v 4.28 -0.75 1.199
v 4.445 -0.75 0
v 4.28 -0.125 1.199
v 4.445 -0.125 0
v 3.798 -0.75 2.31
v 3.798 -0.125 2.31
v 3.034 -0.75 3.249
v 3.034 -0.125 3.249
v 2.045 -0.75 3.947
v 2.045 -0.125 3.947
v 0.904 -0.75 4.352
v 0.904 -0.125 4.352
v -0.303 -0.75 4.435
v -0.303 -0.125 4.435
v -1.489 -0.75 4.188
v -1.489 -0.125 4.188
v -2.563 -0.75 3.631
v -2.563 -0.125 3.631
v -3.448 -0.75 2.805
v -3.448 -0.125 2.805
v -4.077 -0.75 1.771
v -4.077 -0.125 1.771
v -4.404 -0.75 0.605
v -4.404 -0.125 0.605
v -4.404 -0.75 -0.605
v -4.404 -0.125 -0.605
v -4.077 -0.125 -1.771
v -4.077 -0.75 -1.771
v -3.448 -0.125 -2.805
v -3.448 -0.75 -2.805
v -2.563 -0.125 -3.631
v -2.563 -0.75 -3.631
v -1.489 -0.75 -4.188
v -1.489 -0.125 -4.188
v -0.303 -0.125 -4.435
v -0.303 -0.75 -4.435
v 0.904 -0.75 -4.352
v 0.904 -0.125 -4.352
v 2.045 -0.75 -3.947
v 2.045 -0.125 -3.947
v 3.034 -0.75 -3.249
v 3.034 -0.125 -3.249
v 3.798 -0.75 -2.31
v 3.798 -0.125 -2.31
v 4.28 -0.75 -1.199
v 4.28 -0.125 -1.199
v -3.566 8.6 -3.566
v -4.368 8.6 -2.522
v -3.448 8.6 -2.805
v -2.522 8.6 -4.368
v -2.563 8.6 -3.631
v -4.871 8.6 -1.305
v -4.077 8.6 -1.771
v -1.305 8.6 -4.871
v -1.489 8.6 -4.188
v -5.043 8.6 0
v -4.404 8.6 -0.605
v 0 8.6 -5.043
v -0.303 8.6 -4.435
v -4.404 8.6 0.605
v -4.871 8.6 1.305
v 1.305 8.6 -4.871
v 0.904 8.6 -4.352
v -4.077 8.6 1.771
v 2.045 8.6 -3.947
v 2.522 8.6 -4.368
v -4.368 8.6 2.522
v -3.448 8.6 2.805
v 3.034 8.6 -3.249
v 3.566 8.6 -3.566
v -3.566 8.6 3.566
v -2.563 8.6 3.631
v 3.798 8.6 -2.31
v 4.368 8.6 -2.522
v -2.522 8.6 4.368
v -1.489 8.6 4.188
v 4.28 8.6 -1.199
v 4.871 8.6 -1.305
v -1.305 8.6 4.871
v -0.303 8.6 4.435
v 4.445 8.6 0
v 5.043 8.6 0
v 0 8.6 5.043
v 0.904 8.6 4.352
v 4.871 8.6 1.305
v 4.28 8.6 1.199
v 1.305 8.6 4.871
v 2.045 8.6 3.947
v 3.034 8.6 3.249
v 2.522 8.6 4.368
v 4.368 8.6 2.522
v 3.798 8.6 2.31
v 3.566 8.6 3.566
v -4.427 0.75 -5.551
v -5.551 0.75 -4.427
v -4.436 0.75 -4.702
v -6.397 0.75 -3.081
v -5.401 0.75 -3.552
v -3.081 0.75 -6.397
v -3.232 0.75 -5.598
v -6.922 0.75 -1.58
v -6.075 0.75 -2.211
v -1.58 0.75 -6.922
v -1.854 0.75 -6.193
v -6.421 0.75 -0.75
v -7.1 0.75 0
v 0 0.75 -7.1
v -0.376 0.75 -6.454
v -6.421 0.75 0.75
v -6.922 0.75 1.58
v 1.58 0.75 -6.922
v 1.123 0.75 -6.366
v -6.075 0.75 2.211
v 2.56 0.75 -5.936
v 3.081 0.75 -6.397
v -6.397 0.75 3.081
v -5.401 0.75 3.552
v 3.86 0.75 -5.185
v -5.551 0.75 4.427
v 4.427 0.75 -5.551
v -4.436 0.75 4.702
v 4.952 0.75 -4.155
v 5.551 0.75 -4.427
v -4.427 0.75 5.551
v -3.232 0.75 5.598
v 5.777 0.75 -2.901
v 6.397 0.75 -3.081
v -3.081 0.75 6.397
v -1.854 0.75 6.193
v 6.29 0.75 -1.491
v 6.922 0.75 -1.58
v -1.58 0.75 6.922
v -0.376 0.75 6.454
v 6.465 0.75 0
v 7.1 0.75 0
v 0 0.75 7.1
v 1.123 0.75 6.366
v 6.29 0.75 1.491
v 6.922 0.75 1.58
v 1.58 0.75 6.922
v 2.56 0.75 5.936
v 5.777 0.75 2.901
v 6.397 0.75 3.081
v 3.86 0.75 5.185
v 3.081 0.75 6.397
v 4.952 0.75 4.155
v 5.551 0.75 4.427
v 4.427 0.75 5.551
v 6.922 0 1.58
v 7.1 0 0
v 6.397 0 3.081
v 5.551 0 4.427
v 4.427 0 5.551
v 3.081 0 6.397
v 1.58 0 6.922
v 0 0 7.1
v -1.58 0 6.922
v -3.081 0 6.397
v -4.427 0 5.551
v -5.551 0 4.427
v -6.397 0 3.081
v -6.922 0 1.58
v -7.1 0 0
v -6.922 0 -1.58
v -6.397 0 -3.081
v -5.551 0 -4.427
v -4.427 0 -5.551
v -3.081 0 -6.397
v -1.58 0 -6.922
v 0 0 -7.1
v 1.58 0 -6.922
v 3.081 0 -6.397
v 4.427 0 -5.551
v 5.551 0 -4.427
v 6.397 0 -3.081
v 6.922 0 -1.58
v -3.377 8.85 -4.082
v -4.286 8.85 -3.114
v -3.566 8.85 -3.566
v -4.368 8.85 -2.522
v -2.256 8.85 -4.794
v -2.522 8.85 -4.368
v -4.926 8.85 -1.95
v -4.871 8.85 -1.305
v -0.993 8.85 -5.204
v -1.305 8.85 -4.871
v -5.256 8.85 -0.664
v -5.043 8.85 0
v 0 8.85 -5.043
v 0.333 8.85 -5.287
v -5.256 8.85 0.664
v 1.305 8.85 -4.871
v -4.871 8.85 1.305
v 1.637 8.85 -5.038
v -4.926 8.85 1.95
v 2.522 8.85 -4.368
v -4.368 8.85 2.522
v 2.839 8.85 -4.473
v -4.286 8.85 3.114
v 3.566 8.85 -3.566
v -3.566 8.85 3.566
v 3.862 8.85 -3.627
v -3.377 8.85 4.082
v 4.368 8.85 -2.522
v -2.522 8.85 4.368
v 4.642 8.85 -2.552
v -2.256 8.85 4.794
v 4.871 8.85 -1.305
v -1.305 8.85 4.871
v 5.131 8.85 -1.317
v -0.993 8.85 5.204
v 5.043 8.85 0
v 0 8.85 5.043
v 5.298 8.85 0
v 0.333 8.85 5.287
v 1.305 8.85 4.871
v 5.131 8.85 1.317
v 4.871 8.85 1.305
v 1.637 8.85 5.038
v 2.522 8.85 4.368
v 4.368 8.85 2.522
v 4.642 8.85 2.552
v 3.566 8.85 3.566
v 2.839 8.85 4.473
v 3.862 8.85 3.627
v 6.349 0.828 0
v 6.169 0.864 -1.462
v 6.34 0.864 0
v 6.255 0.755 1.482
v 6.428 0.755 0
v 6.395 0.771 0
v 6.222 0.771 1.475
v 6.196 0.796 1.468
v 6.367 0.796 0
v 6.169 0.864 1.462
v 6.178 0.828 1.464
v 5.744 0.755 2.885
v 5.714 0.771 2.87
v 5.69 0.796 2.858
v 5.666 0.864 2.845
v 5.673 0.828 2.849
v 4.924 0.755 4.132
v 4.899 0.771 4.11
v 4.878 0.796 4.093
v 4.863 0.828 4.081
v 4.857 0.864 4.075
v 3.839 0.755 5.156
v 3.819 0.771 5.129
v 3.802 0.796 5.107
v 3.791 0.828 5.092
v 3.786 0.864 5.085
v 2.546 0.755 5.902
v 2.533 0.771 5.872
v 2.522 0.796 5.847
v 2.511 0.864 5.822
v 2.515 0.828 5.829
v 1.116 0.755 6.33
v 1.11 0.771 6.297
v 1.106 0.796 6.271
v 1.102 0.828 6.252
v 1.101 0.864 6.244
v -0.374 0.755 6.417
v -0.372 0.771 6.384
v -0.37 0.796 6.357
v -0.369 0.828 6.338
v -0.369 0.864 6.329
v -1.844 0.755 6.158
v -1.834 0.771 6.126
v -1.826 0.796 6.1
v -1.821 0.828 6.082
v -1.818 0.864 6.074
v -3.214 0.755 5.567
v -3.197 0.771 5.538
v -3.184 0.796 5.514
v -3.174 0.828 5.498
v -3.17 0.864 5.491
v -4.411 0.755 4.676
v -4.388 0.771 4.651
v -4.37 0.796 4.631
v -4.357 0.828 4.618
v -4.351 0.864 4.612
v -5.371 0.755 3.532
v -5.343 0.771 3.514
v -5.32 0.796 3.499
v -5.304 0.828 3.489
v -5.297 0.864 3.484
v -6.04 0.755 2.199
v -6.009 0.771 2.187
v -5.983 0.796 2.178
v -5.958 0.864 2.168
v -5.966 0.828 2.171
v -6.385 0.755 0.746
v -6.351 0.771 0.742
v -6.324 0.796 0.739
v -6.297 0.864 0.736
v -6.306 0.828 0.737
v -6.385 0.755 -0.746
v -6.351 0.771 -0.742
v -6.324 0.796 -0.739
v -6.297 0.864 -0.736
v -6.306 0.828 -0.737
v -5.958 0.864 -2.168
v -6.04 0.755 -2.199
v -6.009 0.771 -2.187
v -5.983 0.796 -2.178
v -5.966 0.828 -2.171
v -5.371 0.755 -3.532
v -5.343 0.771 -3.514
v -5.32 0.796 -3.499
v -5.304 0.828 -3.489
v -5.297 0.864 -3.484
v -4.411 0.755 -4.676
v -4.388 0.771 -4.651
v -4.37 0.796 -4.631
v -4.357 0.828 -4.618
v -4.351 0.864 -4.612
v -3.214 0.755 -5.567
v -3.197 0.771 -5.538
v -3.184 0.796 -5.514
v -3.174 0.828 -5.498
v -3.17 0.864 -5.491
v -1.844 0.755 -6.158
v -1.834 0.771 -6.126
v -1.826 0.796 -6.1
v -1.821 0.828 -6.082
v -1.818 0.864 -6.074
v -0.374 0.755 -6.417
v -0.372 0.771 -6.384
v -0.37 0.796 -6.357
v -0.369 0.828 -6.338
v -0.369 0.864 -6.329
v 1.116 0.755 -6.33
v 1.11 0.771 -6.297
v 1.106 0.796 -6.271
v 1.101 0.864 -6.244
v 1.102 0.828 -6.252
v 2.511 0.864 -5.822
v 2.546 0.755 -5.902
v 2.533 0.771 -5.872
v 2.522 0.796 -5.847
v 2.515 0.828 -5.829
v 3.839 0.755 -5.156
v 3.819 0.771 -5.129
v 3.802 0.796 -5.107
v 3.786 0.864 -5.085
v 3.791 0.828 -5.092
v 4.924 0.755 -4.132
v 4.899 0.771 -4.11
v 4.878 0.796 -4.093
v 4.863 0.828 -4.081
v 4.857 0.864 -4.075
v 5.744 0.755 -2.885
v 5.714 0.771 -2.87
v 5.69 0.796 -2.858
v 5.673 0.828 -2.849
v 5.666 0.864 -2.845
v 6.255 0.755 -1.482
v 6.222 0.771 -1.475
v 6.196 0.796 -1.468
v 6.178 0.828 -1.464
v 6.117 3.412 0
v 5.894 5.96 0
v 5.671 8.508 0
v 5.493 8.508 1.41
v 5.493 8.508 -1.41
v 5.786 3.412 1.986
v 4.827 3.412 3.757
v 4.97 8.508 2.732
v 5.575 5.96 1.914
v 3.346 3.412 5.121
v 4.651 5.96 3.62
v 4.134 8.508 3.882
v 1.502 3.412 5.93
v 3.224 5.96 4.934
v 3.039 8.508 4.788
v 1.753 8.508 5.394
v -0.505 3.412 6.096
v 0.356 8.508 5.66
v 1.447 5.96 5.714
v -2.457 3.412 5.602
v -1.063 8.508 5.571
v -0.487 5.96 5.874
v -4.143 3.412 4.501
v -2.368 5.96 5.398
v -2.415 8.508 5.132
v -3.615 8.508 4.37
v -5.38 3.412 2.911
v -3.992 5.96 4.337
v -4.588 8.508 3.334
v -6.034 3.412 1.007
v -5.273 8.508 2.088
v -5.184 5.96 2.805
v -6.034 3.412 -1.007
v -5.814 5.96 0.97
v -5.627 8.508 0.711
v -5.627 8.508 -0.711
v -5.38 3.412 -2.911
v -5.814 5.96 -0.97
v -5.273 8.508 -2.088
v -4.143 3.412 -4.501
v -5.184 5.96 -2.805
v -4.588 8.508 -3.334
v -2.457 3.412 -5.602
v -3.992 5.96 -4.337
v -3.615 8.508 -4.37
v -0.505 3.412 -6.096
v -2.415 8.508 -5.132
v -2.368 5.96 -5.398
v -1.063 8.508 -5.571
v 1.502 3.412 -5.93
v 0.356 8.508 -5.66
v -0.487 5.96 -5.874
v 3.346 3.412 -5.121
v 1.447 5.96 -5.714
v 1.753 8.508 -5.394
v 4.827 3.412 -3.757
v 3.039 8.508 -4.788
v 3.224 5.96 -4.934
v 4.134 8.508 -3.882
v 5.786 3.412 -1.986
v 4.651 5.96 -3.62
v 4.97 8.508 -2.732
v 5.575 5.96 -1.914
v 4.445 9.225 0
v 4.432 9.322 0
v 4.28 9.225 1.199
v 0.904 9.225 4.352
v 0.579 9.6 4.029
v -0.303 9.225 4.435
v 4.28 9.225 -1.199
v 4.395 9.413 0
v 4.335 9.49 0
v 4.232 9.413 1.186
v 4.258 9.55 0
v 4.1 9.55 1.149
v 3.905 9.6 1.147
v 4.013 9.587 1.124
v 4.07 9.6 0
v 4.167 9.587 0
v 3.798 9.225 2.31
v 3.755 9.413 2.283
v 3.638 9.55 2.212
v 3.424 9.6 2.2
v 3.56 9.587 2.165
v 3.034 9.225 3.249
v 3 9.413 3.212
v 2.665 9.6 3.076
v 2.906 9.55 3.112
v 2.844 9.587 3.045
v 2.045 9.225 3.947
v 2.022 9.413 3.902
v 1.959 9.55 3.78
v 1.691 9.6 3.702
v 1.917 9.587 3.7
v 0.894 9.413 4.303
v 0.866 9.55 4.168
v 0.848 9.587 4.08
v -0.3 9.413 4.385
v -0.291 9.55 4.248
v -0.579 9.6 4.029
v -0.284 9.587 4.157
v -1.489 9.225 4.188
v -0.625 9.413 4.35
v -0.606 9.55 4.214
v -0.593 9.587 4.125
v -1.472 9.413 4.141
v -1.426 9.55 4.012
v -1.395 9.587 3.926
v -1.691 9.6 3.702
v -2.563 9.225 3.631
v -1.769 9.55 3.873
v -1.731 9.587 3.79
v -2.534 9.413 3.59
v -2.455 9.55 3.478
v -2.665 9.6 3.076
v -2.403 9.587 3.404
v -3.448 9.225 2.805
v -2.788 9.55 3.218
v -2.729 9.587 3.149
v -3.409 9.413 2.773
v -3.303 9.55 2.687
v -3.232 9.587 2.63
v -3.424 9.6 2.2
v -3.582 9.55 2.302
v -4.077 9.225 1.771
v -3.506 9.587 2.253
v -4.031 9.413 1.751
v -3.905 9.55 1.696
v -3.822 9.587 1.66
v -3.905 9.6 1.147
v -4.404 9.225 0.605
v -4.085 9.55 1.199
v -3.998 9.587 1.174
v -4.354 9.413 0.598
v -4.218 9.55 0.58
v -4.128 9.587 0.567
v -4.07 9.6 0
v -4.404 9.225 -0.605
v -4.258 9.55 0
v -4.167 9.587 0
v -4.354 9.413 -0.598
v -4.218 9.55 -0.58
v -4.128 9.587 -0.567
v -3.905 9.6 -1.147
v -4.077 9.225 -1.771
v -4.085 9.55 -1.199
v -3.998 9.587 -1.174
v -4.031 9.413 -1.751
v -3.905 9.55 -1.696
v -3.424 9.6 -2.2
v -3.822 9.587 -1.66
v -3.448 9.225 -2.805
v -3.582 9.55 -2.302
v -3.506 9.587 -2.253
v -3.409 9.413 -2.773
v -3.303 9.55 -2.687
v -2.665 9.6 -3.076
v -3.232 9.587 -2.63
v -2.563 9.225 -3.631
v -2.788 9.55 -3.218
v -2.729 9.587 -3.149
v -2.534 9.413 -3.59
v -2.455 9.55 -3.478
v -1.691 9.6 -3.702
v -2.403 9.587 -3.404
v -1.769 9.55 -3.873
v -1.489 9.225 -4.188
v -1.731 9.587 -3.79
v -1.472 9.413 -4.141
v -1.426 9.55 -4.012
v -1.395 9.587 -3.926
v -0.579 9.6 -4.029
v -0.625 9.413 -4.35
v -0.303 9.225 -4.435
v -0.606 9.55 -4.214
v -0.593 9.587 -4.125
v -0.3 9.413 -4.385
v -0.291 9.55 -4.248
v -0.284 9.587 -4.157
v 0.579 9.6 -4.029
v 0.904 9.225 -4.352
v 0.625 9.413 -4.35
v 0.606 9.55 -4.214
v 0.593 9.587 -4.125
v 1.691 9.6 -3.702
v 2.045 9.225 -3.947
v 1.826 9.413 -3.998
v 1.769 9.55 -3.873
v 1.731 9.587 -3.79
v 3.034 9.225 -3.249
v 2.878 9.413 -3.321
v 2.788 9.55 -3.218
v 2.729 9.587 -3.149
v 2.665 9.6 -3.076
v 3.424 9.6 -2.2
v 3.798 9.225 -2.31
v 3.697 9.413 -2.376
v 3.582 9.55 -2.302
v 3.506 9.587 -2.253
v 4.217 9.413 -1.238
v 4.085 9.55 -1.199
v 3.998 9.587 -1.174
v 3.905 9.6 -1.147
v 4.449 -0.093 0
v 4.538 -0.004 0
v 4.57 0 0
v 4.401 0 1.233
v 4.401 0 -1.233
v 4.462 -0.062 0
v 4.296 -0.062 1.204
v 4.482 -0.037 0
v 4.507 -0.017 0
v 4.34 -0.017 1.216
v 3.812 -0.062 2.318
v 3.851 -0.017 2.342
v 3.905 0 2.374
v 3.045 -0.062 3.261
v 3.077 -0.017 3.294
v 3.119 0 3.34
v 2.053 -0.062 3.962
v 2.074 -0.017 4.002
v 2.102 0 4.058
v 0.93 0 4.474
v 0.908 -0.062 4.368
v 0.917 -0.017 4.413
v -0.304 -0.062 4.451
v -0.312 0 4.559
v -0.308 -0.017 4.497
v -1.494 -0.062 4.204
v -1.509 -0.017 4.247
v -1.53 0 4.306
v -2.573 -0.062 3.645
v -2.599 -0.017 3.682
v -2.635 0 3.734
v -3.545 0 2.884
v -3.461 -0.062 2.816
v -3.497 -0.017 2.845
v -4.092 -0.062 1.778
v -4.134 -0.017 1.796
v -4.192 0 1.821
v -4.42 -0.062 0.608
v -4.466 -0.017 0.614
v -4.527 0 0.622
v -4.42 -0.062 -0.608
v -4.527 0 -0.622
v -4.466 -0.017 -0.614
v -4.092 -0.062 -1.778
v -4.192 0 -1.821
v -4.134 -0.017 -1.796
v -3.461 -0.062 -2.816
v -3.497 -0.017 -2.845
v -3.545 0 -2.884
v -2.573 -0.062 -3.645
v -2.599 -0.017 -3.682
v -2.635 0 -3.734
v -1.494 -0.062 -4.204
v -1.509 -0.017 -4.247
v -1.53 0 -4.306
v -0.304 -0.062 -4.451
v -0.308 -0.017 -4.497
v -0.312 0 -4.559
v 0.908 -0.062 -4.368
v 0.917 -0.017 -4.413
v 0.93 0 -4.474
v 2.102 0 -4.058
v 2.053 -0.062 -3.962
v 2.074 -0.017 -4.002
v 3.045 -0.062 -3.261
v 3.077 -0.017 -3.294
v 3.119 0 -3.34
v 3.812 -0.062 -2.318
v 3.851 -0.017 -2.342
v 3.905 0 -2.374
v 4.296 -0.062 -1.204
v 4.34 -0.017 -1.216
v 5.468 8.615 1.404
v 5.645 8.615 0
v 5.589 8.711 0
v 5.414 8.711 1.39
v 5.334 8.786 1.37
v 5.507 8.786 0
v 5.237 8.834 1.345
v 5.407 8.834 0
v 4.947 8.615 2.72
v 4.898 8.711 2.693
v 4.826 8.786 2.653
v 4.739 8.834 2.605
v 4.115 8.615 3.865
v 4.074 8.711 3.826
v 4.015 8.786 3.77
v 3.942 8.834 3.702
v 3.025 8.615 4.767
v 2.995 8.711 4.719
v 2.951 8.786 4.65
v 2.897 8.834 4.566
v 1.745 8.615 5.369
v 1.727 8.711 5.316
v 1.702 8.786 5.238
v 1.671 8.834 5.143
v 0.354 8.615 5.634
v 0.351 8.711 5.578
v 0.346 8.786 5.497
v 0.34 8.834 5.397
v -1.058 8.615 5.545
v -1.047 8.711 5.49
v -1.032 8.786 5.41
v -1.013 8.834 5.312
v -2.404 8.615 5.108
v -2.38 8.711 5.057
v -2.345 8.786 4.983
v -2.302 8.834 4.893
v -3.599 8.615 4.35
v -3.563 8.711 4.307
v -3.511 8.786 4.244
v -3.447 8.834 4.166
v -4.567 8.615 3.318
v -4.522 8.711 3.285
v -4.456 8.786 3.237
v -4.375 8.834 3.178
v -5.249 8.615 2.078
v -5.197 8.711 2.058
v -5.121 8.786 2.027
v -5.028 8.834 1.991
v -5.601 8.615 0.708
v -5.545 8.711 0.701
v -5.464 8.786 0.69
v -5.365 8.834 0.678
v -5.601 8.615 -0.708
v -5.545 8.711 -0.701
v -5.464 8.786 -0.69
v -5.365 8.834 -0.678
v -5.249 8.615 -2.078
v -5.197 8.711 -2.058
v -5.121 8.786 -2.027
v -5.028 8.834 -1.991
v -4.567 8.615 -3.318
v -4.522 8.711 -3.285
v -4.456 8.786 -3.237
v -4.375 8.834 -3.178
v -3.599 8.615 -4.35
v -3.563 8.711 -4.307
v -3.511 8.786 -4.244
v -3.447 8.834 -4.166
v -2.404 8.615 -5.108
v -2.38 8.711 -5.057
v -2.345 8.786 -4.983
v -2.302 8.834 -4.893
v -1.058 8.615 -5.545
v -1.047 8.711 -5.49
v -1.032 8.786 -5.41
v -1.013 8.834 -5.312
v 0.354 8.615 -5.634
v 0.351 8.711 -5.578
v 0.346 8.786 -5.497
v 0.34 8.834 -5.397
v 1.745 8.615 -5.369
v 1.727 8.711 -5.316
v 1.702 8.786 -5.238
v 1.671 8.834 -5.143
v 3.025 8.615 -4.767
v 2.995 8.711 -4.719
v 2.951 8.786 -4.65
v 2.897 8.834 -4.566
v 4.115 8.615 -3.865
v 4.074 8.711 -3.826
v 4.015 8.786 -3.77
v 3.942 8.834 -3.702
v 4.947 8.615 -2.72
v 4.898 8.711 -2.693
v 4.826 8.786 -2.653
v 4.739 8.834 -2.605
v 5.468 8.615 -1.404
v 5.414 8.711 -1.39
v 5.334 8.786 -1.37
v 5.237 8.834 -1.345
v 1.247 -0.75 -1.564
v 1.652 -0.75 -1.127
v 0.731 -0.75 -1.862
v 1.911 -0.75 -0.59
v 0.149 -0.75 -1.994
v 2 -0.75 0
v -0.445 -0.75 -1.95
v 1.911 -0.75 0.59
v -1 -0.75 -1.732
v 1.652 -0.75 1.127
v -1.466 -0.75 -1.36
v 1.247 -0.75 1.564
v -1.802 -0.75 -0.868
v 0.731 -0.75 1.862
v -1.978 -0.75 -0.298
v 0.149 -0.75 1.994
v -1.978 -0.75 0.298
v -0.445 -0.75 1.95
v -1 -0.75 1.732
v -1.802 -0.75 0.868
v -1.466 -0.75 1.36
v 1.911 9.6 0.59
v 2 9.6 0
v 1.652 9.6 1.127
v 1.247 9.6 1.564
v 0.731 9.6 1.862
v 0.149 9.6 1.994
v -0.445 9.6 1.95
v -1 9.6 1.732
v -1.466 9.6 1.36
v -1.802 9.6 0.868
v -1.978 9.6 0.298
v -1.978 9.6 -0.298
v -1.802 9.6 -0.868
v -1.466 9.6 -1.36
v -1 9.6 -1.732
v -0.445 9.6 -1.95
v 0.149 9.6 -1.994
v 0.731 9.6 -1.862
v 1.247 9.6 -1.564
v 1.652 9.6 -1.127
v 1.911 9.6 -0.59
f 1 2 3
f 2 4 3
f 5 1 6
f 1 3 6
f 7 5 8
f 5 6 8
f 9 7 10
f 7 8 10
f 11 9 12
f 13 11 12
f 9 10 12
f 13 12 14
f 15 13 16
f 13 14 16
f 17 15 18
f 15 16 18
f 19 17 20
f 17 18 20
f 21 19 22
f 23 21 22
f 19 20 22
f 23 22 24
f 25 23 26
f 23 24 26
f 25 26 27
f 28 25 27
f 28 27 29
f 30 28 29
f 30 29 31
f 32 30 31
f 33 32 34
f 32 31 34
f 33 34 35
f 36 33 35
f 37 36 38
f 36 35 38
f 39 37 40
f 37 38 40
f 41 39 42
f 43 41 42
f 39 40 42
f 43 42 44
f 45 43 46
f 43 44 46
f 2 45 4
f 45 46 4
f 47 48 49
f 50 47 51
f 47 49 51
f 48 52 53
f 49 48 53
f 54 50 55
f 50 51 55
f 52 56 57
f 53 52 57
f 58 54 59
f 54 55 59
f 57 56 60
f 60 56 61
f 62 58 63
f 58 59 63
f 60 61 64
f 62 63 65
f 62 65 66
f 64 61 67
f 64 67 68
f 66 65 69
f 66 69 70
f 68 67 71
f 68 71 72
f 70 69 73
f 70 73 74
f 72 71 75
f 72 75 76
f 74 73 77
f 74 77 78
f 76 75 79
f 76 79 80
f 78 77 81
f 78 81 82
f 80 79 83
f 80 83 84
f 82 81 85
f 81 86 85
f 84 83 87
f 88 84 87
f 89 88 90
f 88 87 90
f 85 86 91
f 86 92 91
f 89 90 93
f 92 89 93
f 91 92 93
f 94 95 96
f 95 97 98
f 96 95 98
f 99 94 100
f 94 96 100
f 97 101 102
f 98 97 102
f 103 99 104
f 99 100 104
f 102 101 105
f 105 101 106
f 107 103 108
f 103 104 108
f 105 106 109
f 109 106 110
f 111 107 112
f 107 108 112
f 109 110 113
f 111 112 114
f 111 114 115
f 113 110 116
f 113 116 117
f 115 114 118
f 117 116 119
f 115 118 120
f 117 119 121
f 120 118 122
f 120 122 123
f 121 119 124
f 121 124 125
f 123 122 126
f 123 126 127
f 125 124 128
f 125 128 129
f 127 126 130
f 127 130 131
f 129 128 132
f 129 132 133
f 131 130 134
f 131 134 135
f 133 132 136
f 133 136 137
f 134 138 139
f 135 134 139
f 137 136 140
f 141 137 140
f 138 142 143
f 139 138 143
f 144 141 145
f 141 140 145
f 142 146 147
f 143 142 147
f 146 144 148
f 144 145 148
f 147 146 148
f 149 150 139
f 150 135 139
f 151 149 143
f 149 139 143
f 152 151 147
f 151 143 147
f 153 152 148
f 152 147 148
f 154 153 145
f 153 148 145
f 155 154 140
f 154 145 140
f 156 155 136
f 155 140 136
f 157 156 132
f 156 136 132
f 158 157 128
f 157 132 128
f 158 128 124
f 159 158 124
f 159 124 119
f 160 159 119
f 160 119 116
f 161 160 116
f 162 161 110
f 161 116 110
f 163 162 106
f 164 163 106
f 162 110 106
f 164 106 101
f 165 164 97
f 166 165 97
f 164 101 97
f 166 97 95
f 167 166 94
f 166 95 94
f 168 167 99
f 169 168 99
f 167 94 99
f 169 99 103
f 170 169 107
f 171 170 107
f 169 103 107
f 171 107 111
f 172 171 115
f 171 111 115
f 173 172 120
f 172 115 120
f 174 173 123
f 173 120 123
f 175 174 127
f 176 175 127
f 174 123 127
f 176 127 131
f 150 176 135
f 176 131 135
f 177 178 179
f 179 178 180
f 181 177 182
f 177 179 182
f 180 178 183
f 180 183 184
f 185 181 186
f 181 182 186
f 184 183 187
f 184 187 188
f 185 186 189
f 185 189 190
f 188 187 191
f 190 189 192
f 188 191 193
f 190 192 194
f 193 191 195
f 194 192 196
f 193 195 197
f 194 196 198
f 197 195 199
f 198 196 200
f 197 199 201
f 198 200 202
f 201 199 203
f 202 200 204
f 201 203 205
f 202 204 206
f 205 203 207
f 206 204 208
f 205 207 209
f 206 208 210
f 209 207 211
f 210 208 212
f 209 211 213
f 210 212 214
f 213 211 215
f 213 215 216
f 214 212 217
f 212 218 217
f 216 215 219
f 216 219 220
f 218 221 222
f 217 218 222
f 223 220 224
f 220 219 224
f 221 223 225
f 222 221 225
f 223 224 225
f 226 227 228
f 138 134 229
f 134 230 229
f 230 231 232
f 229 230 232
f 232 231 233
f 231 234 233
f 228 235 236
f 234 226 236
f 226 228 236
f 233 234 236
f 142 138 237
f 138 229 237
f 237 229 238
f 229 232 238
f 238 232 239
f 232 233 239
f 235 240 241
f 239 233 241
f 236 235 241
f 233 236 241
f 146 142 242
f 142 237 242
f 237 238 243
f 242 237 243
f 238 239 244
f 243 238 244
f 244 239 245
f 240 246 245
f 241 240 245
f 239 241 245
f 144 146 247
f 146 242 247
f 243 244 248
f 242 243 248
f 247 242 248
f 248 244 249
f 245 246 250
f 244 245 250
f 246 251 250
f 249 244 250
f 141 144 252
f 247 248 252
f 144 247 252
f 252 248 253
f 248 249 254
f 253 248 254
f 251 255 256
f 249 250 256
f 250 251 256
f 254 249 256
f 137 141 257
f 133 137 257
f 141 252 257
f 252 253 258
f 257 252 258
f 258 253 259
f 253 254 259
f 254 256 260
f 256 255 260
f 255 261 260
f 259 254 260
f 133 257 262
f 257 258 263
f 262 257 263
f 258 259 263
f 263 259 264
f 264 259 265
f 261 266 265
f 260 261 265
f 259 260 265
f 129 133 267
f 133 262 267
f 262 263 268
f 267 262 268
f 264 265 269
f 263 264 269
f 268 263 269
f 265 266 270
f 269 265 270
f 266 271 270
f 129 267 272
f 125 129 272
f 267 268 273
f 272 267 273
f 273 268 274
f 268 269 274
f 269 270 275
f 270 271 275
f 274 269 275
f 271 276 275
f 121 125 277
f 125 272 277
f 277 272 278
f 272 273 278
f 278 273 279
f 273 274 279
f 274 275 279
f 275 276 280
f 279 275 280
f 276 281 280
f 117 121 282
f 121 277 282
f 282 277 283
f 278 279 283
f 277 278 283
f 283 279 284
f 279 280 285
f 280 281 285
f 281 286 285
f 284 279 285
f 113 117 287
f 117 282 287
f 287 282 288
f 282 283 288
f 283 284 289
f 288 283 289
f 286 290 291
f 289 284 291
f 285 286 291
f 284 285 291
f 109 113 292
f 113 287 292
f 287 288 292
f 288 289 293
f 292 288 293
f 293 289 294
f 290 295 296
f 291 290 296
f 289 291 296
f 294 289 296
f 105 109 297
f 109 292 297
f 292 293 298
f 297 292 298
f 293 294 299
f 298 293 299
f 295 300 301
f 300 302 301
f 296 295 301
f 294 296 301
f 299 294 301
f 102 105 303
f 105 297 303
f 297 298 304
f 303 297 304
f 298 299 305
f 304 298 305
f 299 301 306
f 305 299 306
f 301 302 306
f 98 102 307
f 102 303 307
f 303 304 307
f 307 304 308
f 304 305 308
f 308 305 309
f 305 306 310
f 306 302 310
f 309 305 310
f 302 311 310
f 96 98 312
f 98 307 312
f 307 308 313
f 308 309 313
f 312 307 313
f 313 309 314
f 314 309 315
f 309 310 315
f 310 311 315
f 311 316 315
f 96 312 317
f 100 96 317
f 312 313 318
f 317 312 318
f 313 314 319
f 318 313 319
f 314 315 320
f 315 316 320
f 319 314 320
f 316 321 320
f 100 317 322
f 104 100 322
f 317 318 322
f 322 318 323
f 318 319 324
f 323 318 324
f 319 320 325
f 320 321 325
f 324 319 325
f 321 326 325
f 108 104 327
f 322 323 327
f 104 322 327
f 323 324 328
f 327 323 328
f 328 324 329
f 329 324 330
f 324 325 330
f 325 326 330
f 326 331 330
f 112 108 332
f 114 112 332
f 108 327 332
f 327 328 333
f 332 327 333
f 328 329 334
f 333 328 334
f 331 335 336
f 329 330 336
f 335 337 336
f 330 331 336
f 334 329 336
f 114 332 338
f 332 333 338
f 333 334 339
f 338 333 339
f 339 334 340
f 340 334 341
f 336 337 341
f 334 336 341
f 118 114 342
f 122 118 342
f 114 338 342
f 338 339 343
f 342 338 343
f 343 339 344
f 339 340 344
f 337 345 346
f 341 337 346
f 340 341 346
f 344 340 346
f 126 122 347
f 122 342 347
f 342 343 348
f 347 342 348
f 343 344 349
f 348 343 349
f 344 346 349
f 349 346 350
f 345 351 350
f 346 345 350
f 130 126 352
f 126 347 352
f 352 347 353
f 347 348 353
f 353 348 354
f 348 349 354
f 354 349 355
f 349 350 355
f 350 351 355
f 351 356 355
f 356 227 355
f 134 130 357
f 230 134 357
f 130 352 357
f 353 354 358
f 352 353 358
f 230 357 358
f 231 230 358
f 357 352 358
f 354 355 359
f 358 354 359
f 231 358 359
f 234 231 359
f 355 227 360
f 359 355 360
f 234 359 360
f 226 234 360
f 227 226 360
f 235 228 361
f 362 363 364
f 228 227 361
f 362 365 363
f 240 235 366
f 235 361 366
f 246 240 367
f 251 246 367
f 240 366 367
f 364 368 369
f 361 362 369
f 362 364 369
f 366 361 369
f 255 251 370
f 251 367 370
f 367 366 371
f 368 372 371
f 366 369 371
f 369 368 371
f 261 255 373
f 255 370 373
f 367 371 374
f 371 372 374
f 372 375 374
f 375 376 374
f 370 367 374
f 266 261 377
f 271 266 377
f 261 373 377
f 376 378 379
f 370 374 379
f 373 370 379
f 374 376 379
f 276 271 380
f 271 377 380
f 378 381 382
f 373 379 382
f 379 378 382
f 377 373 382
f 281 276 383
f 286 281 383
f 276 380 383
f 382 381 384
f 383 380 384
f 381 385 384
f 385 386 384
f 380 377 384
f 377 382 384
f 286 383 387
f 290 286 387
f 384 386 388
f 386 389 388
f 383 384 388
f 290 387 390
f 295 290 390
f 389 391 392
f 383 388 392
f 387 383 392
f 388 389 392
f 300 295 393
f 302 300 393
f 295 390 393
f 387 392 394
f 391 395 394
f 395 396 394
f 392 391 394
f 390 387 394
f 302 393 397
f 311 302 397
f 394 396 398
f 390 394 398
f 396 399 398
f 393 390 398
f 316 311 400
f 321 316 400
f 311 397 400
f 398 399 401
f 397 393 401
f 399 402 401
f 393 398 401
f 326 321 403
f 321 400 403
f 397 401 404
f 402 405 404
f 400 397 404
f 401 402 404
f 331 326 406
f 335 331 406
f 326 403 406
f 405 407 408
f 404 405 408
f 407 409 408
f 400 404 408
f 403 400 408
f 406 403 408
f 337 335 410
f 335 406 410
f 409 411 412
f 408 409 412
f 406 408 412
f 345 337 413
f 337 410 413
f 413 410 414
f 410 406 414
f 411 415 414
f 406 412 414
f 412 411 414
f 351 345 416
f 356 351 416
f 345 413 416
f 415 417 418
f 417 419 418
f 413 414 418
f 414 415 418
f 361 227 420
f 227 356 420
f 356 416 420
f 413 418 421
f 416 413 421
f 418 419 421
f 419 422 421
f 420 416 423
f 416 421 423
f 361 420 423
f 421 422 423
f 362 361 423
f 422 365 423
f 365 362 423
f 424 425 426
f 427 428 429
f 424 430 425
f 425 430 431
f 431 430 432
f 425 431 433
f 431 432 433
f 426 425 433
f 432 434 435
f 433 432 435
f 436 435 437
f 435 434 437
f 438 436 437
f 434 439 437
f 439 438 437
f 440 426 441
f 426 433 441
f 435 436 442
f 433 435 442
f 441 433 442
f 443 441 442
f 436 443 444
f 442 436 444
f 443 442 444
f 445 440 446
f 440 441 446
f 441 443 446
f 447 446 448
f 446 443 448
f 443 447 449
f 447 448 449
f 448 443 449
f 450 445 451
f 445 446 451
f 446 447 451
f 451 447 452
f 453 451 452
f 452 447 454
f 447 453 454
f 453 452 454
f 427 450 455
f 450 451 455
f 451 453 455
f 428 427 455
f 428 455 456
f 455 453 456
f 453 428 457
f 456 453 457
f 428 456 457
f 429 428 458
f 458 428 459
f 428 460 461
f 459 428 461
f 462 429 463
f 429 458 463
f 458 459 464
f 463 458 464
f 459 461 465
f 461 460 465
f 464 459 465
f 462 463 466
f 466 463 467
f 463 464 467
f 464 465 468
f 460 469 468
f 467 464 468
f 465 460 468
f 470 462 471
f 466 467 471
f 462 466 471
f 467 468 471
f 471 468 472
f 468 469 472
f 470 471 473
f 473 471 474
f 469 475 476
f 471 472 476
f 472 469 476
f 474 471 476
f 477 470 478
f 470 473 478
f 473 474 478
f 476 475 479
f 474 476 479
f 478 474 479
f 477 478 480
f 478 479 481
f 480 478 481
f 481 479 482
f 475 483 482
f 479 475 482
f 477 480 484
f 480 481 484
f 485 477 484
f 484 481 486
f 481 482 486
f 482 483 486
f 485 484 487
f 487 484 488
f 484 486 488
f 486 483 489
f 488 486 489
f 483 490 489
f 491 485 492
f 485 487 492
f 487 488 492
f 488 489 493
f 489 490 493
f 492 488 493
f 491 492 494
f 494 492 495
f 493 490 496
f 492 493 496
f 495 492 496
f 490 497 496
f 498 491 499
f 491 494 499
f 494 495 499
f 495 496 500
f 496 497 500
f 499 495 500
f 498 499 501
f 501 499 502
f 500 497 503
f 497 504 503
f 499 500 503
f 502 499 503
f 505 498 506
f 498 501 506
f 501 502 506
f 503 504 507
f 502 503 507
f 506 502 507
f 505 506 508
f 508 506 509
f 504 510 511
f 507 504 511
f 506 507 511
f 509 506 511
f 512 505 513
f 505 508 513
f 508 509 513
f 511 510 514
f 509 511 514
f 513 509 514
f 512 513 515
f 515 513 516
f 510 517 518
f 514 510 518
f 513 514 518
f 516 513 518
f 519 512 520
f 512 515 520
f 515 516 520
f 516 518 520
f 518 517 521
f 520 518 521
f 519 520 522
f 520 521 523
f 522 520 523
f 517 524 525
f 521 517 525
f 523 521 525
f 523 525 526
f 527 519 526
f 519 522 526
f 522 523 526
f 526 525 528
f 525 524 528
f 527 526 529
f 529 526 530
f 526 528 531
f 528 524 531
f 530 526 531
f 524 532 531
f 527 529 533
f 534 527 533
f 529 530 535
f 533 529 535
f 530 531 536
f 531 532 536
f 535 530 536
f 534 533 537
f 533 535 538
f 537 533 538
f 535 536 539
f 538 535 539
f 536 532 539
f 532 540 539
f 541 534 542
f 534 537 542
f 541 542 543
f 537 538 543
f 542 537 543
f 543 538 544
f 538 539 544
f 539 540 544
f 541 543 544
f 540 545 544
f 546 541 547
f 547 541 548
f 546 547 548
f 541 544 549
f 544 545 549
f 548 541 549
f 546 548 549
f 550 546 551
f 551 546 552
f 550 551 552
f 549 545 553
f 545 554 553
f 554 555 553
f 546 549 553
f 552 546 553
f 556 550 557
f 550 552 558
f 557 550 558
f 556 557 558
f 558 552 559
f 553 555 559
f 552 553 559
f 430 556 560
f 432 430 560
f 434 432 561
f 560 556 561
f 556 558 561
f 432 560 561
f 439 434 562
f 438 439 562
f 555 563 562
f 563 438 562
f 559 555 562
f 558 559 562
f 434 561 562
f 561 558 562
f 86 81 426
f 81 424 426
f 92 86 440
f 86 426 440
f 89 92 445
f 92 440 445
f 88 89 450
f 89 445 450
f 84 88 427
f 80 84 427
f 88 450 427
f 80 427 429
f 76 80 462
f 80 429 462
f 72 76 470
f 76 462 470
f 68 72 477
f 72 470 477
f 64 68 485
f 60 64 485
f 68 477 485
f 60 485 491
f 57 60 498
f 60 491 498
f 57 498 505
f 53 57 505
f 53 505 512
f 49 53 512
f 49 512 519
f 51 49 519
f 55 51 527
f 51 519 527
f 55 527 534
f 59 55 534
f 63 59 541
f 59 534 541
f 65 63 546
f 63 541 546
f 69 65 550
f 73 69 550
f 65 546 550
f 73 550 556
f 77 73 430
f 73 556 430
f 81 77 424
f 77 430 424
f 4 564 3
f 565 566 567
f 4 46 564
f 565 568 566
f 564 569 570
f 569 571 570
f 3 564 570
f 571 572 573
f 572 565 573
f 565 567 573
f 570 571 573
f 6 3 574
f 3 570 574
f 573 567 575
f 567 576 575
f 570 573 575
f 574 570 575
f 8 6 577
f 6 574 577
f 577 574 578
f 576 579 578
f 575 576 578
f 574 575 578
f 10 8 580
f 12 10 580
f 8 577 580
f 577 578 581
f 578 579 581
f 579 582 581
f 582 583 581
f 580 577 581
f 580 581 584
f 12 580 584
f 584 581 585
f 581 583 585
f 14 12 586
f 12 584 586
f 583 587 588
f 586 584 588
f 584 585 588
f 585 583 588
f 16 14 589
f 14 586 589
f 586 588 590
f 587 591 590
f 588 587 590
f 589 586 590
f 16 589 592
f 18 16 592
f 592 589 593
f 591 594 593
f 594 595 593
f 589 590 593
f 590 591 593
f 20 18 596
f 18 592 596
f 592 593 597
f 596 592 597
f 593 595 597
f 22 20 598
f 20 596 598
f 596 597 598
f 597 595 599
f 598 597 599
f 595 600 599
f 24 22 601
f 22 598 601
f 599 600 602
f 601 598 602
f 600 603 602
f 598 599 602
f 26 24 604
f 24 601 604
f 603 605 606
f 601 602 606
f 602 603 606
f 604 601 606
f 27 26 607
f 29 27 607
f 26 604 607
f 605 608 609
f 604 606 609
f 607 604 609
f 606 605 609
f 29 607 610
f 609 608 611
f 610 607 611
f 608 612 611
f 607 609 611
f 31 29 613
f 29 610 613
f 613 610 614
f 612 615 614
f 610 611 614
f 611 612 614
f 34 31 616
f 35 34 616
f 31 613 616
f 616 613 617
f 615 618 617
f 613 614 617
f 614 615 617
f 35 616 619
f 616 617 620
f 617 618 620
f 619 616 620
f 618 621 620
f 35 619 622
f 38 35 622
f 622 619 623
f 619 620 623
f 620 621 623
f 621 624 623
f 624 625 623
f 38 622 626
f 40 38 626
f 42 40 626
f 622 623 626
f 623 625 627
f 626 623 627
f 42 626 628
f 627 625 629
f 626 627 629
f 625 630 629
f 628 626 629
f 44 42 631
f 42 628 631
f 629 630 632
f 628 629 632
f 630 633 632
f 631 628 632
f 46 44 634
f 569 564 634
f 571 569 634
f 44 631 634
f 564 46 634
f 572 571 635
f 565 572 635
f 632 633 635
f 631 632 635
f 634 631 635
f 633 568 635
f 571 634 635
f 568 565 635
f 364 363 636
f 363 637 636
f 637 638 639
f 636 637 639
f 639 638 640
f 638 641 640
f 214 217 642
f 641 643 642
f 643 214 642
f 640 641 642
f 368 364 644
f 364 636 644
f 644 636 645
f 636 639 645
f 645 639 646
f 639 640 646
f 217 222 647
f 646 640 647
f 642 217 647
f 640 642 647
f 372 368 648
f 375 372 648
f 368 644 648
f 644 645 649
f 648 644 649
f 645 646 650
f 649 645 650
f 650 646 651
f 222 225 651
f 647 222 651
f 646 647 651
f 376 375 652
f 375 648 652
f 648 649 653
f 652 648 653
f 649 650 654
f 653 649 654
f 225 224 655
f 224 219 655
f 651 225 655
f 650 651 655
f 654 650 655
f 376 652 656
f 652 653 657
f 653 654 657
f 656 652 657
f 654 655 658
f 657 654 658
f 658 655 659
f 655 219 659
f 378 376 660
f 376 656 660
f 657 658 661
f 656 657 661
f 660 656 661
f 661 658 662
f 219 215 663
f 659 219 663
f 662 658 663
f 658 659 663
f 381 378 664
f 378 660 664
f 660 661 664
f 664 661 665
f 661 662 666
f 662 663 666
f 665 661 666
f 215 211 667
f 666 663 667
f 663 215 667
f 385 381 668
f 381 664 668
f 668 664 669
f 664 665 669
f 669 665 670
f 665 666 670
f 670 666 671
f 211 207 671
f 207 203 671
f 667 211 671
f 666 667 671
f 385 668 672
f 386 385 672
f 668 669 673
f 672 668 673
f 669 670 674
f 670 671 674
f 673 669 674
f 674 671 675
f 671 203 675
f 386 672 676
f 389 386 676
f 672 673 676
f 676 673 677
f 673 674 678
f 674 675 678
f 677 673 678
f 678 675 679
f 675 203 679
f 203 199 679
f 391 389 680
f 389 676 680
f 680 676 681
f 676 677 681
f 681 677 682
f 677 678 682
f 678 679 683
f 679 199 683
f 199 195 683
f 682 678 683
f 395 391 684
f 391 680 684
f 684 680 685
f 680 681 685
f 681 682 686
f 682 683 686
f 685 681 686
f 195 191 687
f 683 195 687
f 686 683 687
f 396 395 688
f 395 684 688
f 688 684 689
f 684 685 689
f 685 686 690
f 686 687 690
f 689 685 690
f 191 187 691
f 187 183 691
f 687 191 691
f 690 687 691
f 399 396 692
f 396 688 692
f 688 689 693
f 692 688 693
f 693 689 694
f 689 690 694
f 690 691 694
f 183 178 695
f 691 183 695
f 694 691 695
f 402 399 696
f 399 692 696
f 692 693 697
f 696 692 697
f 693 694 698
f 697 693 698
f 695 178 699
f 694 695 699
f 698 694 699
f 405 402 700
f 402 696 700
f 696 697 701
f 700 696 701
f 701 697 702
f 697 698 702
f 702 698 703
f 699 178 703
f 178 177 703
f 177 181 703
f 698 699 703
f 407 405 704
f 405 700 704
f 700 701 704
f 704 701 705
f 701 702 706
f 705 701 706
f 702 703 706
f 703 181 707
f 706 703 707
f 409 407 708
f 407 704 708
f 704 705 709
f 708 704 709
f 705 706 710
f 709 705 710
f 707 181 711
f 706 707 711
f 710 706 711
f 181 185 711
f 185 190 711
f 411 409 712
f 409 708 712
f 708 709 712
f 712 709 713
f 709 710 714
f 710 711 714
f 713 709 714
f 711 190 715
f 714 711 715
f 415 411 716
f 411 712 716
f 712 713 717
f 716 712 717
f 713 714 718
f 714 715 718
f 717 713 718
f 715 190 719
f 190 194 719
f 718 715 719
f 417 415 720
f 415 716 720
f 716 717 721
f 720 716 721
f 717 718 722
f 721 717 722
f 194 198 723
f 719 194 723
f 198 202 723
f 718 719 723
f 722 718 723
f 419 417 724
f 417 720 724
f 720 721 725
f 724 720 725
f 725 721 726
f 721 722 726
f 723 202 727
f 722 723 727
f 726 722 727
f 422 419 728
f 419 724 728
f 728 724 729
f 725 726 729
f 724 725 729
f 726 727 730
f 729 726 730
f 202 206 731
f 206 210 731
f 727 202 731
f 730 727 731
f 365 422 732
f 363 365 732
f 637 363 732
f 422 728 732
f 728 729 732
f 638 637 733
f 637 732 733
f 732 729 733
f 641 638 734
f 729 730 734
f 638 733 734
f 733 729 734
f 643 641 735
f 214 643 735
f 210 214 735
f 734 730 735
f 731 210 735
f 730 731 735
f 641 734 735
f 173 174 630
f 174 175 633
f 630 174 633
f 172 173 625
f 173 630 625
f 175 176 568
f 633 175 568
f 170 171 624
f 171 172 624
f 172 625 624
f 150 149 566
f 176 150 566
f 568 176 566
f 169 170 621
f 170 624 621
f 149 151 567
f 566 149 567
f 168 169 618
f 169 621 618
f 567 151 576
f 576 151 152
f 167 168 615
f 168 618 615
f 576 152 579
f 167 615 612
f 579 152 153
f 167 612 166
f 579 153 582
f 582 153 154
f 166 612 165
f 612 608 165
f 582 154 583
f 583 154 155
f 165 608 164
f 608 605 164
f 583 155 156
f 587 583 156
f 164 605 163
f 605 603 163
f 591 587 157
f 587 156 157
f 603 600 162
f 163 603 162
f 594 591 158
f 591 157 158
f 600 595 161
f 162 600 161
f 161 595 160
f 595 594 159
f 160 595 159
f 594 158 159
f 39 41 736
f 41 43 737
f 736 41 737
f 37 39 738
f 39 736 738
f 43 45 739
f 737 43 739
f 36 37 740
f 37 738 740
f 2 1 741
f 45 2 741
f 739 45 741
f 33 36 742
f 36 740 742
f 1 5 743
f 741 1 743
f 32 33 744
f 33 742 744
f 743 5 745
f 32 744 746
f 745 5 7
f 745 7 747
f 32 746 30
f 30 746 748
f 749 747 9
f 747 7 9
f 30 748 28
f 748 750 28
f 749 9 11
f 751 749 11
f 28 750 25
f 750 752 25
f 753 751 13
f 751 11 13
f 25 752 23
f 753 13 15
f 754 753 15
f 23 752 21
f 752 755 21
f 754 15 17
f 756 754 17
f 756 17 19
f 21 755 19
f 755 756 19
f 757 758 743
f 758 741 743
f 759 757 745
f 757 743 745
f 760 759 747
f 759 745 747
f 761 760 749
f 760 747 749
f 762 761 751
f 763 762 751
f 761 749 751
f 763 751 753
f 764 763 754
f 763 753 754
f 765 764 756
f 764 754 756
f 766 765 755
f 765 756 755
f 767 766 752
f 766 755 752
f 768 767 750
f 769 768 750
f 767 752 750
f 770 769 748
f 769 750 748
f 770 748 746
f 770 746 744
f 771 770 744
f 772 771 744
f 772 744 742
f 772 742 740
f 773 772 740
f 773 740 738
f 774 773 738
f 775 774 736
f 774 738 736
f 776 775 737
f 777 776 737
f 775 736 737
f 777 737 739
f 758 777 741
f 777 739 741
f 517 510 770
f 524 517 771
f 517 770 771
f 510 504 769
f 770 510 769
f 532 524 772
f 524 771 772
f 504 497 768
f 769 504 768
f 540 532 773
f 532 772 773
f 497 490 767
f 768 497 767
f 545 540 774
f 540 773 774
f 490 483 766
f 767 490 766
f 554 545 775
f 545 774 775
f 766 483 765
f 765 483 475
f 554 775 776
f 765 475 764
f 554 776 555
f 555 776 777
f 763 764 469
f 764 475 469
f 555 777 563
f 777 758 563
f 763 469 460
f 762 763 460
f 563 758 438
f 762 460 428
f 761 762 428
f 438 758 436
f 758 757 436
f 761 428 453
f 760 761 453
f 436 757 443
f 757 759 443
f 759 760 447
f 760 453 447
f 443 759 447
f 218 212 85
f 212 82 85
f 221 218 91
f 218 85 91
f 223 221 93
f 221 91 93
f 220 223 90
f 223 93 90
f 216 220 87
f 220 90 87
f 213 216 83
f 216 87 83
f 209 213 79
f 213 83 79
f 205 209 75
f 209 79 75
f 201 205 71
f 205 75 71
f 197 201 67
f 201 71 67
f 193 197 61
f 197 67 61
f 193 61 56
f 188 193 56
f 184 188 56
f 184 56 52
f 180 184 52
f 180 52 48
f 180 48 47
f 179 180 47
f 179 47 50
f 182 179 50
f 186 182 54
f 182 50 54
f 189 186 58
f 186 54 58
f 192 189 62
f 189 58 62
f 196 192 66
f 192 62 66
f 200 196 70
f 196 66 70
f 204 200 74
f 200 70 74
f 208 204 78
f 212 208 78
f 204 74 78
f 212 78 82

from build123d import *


with BuildPart() as part:
    # Sketch1 → Revolve1 (revolve)
    with BuildSketch(Plane.XY):
        with BuildLine():
            Line((4.07, 9.6), (2, 9.6))
            Line((2, 9.6), (2, -0.75))
            Line((2, -0.75), (4.445, -0.75))
            Line((4.445, -0.75), (4.445, -0.125))
            ThreePointArc((4.445, -0.125), (4.481611652, -0.036611652), (4.57, 0))
            Line((4.57, 0), (7.1, 0))
            Line((7.1, 0), (7.1, 0.75))
            Line((7.1, 0.75), (6.464541397, 0.75))
            ThreePointArc((6.464541397, 0.75), (6.380092621, 0.782840333), (6.340017059, 0.864105532))
            Line((6.340017059, 0.864105532), (5.671290647, 8.507683404))
            ThreePointArc((5.671290647, 8.507683404), (5.551063963, 8.751479001), (5.297717635, 8.85))
            Line((5.297717635, 8.85), (5.043170913, 8.85))
            Line((5.043170913, 8.85), (5.043170913, 8.6))
            Line((5.043170913, 8.6), (4.445, 8.6))
            Line((4.445, 8.6), (4.445, 9.225))
            ThreePointArc((4.445, 9.225), (4.335165043, 9.490165043), (4.07, 9.6))
        make_face()
    revolve(axis=Axis((0, 9.60267581, 0), (0, -1, 0)))


solid = part.part
